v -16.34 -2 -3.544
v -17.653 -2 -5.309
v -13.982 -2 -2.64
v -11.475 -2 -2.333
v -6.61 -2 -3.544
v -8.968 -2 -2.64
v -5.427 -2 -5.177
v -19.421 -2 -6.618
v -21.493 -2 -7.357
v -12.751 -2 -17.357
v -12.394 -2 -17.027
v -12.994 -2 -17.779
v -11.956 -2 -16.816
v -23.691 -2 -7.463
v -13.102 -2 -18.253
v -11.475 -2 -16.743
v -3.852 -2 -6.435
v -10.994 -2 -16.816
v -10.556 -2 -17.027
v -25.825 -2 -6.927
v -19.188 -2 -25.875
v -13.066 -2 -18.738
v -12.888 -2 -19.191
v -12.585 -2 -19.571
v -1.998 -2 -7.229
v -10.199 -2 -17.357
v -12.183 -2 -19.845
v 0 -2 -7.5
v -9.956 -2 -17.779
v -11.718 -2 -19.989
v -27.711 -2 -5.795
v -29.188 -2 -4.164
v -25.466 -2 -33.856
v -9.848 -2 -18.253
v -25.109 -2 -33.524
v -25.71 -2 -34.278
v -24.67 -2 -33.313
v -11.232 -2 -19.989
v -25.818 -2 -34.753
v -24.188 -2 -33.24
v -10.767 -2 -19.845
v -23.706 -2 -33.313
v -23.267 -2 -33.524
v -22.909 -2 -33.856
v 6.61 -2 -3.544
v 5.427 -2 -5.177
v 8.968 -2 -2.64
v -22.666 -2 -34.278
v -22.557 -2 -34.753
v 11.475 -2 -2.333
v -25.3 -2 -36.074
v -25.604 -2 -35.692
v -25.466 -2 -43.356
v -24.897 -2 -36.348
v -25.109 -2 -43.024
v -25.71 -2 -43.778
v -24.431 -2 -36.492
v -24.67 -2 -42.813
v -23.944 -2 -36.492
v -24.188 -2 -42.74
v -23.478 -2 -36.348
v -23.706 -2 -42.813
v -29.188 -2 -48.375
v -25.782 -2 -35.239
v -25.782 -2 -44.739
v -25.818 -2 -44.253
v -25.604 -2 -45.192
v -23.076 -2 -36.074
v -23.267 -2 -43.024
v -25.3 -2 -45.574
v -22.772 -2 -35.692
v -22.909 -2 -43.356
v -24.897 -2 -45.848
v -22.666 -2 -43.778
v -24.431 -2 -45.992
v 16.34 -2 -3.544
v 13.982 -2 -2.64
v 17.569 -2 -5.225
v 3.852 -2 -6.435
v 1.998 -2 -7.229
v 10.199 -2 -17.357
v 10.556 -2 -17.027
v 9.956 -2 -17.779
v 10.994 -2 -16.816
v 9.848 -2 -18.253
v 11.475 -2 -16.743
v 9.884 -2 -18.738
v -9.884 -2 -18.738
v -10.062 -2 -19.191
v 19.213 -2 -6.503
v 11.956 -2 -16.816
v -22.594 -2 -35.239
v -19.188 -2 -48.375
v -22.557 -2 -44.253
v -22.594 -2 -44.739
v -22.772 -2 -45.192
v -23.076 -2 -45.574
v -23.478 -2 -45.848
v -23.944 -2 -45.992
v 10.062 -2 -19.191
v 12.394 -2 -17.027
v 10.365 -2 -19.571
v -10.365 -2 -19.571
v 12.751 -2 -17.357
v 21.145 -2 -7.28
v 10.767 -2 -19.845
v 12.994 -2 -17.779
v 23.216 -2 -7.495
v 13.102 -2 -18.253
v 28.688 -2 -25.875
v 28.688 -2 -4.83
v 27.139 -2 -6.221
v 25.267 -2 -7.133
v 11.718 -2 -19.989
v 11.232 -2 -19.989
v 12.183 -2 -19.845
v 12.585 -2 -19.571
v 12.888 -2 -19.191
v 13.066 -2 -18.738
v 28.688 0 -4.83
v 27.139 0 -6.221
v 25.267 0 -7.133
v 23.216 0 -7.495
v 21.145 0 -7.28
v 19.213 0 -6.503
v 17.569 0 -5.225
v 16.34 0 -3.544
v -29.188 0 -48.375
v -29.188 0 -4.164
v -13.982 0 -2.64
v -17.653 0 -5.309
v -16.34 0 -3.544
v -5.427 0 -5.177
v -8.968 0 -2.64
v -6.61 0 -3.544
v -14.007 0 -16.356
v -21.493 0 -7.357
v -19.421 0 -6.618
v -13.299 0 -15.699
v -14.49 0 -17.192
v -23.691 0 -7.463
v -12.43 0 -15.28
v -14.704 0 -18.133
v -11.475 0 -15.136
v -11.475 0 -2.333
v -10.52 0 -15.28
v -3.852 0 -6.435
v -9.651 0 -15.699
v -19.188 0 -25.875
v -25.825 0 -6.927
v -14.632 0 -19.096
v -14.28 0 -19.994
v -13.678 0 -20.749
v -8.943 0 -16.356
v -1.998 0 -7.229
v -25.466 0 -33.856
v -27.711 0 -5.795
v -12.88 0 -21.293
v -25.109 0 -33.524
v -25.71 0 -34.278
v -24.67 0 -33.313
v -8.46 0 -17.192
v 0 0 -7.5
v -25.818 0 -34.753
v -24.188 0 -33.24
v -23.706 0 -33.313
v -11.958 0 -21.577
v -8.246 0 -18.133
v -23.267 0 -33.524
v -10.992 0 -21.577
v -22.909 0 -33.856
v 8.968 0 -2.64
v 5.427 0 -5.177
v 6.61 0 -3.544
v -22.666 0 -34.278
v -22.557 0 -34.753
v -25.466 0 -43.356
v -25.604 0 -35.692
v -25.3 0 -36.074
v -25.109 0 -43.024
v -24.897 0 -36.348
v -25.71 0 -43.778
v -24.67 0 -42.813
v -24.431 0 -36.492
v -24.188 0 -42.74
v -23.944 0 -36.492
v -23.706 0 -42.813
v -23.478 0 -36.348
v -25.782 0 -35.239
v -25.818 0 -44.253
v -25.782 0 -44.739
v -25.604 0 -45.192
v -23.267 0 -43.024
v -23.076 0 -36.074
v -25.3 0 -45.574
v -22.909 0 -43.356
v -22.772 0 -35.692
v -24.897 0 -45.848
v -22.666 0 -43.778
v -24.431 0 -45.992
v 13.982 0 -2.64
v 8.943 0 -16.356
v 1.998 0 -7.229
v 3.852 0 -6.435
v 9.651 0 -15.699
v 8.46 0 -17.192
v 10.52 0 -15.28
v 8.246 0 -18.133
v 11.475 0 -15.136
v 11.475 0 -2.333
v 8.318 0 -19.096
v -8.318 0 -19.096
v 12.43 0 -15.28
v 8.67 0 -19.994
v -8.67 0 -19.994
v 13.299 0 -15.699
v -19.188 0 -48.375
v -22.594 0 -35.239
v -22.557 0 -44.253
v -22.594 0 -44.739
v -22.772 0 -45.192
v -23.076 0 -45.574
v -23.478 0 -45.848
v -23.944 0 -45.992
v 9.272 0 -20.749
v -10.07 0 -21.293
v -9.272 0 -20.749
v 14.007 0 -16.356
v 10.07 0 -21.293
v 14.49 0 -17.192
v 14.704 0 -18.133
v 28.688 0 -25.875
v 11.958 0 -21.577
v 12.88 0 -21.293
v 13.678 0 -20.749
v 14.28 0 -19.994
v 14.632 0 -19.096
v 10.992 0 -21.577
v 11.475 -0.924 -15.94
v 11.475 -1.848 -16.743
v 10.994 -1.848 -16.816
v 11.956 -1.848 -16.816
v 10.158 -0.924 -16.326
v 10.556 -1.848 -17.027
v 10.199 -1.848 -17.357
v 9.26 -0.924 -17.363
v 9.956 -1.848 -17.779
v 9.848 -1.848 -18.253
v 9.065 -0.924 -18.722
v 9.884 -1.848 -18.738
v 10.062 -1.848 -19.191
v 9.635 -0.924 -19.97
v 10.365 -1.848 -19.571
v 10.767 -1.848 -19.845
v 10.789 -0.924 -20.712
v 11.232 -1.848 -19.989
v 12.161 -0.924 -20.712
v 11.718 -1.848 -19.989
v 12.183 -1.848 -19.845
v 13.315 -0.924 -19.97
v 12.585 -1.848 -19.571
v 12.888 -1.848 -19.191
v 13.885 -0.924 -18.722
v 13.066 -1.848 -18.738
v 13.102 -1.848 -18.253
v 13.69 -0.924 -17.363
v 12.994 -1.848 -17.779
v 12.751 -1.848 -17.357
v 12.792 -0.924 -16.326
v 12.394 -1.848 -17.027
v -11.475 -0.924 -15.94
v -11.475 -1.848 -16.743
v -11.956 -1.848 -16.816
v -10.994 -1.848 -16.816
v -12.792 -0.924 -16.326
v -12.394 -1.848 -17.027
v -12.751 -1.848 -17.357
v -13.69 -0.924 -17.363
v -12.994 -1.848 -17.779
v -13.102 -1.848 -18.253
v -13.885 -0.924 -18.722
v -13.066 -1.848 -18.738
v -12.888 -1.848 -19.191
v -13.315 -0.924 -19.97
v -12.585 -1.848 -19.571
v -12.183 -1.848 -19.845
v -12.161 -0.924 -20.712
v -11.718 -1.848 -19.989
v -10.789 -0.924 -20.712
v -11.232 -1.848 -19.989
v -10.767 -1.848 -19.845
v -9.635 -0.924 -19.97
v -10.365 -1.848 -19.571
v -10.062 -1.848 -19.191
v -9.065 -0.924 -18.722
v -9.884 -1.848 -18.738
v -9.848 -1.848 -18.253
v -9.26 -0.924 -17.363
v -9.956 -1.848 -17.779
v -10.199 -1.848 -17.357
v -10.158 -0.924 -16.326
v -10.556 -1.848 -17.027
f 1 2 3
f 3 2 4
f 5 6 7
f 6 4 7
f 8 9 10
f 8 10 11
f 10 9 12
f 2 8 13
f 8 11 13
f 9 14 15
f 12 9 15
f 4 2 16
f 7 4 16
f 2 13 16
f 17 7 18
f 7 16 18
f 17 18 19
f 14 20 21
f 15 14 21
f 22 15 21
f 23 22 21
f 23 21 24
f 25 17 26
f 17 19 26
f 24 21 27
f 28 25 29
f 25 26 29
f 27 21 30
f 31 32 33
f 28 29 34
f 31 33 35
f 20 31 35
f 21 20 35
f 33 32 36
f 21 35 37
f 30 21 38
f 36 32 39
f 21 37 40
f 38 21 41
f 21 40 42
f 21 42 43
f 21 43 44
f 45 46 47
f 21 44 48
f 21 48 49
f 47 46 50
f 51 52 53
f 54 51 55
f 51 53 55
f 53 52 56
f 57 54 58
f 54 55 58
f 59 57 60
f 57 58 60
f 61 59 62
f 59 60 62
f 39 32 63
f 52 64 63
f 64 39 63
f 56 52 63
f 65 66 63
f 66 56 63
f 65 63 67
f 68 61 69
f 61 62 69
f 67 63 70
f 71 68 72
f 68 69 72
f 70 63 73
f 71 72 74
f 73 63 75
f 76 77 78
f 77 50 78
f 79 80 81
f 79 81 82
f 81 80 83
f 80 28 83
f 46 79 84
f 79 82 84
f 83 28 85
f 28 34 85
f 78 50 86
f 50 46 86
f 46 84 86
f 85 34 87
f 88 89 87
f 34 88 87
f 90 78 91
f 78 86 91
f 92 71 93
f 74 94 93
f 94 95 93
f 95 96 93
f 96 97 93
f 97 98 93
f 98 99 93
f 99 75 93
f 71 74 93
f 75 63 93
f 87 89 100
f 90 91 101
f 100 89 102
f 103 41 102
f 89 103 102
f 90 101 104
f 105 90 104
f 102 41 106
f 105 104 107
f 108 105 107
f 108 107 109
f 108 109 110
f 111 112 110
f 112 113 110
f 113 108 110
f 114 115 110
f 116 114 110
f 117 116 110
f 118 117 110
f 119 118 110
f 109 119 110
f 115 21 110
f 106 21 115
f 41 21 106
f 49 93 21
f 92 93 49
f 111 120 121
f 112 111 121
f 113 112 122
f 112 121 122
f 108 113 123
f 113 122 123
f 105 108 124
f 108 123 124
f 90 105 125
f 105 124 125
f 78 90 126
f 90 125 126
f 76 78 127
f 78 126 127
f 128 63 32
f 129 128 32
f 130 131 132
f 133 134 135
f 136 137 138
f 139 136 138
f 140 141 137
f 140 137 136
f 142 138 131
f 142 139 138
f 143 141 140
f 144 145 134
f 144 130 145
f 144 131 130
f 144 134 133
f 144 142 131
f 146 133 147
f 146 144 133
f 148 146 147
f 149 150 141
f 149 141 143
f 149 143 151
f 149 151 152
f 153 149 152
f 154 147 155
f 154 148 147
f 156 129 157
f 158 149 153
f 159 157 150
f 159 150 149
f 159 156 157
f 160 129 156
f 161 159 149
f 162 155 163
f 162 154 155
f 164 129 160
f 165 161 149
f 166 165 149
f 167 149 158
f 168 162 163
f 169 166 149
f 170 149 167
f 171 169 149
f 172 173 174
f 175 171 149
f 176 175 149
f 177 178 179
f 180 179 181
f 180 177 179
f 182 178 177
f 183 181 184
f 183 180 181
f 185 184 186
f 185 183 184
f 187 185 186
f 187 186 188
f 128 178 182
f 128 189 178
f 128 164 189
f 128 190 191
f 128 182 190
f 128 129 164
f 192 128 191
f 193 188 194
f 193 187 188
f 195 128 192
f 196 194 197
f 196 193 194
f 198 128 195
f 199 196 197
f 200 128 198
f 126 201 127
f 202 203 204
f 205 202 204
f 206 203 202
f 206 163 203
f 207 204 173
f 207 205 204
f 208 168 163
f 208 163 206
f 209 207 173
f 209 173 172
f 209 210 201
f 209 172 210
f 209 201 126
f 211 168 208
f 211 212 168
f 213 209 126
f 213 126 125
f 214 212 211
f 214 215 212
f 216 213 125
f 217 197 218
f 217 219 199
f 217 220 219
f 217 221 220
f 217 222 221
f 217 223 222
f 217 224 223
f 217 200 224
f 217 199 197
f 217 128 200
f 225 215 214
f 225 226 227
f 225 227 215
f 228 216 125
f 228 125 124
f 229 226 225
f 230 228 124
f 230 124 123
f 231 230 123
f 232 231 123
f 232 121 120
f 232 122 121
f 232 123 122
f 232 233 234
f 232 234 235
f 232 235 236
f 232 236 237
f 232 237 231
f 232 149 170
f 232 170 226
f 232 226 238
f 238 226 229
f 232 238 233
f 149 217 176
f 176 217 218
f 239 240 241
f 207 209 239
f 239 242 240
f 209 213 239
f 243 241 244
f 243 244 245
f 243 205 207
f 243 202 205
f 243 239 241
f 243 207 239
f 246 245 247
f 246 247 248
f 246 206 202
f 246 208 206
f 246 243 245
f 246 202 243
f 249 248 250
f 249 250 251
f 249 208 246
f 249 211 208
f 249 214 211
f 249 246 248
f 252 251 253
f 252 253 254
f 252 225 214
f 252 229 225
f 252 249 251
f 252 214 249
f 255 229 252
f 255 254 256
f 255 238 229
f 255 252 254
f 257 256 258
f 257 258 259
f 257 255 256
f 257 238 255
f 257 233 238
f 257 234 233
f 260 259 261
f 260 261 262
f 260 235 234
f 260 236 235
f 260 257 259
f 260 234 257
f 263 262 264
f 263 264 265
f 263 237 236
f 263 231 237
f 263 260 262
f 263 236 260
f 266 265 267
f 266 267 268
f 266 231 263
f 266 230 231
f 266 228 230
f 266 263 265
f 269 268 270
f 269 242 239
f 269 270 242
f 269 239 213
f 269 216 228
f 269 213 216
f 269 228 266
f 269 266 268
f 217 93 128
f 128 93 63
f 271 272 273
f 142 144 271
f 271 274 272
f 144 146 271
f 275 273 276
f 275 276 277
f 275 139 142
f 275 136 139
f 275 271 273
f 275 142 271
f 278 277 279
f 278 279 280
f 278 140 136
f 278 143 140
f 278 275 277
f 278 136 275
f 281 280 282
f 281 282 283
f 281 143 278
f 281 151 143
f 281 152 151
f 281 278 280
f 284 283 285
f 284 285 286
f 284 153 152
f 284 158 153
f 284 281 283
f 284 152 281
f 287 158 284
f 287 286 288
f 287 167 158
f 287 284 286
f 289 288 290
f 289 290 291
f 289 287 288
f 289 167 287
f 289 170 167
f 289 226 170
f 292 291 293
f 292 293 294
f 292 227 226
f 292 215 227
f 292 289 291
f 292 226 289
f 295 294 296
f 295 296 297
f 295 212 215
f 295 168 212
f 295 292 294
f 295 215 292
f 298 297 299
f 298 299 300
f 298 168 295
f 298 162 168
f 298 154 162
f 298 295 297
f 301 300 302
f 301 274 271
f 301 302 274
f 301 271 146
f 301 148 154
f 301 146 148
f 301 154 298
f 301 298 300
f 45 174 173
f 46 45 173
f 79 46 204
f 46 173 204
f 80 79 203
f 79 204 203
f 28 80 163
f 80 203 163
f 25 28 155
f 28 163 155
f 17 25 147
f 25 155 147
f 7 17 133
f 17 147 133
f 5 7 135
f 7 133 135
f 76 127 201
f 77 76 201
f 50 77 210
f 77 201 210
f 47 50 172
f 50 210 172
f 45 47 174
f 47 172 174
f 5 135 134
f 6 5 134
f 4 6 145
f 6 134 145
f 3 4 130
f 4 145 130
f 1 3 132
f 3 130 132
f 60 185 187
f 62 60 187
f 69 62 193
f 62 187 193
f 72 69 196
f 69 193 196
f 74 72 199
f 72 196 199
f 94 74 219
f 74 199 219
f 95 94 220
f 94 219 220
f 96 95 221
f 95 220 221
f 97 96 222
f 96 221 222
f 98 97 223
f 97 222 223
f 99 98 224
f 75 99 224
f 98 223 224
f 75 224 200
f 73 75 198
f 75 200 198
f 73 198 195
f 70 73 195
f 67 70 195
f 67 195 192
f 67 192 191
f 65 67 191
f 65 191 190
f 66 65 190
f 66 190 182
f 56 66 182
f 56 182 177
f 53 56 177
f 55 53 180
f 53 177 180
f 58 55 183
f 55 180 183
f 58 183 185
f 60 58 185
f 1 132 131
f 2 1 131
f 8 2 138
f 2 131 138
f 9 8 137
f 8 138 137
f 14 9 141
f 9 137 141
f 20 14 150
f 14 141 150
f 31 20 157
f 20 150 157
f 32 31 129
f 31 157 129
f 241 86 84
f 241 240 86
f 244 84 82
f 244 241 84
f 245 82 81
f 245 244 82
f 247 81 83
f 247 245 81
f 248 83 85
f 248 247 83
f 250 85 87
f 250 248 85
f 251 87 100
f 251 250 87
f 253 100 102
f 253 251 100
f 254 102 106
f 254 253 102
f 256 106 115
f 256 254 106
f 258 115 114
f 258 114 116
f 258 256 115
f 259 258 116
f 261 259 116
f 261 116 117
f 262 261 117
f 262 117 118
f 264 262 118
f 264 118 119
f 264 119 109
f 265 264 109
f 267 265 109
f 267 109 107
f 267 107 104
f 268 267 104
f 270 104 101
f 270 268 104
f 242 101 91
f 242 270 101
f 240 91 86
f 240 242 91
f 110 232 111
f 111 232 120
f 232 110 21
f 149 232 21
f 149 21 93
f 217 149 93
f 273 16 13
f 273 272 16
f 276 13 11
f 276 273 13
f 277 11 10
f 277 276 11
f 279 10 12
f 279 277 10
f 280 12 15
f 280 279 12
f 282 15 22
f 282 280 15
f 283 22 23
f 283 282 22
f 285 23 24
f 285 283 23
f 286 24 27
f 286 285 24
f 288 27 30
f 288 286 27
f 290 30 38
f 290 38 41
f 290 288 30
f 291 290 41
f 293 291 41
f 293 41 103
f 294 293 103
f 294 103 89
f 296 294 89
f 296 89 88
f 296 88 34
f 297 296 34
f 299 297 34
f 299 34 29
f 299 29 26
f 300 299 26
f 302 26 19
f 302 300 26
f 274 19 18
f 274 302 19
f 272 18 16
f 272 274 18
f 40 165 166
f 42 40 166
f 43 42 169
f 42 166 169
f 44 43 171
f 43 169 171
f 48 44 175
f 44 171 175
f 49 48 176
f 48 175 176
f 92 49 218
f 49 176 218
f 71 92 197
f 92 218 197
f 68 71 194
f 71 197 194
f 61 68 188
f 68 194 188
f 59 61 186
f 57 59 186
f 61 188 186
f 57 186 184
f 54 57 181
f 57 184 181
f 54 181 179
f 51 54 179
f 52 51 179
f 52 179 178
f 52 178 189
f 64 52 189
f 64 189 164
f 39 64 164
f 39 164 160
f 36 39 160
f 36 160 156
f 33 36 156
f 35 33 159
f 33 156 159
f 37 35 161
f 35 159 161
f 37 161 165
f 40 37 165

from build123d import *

# Parameters (mm, degrees)
BASE_FLANGE1_START                            = -2
BASE_FLANGE1_DEPTH                            = 2
SKETCH8_R                                     = 1.635
CUT_EXTRUDE1_DEPTH                            = 2
CSK_FOR_4_FLAT_HEAD_SOCKET_CAP_SCREW1_A_COUNT = 2
CSK_FOR_4_FLAT_HEAD_SOCKET_CAP_SCREW1_A_PITCH = 22.95
CUT_EXTRUDE2_DEPTH                            = 2


# Read off the part's stored shape, not the designer's step: Base-Flange1
with BuildPart() as part:
    # Base-Flange1 outline → Base-Flange1 (new body)
    with BuildSketch(Plane(origin=(0, 0, 0), x_dir=(1, 0, 0), z_dir=(0, 1, 0)).offset(BASE_FLANGE1_START)):
        with BuildLine():
            ThreePointArc((-29.187643745, 3.176759435), (-22.95, 7), (-16.712356255, 3.176759435))
            ThreePointArc((-16.712356255, 3.176759435), (-11.475, 1.832537182), (-6.237643745, 3.176759435))
            ThreePointArc((-6.237643745, 3.176759435), (0, 7), (6.237643745, 3.176759435))
            ThreePointArc((6.237643745, 3.176759435), (11.475, 1.832537182), (16.712356255, 3.176759435))
            ThreePointArc((16.712356255, 3.176759435), (22.95, 7), (29.187643745, 3.176759435))
            Line((29.187643745, 3.176759435), (29.187643745, 25.875))
            Line((29.187643745, 25.875), (-19.187643745, 25.875))
            Line((-19.187643745, 25.875), (-19.187643745, 48.375))
            Line((-19.187643745, 48.375), (-29.187643745, 48.375))
            Line((-29.187643745, 48.375), (-29.187643745, 3.176759435))
        make_face()
    extrude(amount=BASE_FLANGE1_DEPTH)

    # Sketch8 → Cut-Extrude1 (cut)
    with BuildSketch(Plane(origin=(0, 0, 0), x_dir=(1, 0, 0), z_dir=(0, 1, 0))):
        with Locations(Location((-24.187643745, 44.375, 0), (0, 0, 270))):
            Circle(SKETCH8_R)
        with Locations(Location((-24.187643745, 34.875, 0), (0, 0, 270))):
            Circle(SKETCH8_R)
    extrude(amount=-CUT_EXTRUDE1_DEPTH, mode=Mode.SUBTRACT)

    # Sketch10 → CSK for #4 Flat Head Socket Cap Screw1 (revolve, cut)
    with BuildSketch(Plane(origin=(11.475, 0, -18.375), x_dir=(0, 0, 1), z_dir=(1, 0, 0))):
        Polygon((0, 0), (0, 2.980574487), (1.63195, 2), (1.63195, 1.848124365), (3.2385, 0), align=None)
    csk_for_4_flat_head_socket_cap_screw1 = revolve(axis=Axis((11.475, 6.35, -18.375), (0, -1, 0)), mode=Mode.SUBTRACT)

    # CSK for #4 Flat Head Socket Cap Screw1 a: CSK for #4 Flat Head Socket Cap Screw1 ×2
    with Locations(*[(-i * CSK_FOR_4_FLAT_HEAD_SOCKET_CAP_SCREW1_A_PITCH, 0, 0) for i in range(1, CSK_FOR_4_FLAT_HEAD_SOCKET_CAP_SCREW1_A_COUNT)]):
        add(csk_for_4_flat_head_socket_cap_screw1, mode=Mode.SUBTRACT)

    # Sketch12 → Cut-Extrude2 (cut)
    with BuildSketch(Plane(origin=(0, 0, 0), x_dir=(1, 0, 0), z_dir=(0, 1, 0))):
        with BuildLine():
            Line((-29.633189727, 3.403670823), (-29.633189727, -1.121913875))
            Line((-29.633189727, -1.121913875), (35.30589457, -1.121913875))
            Line((35.30589457, -1.121913875), (35.30589457, 25.875))
            Line((35.30589457, 25.875), (28.687643745, 25.875))
            Line((28.687643745, 25.875), (28.687643745, 4.83005634))
            ThreePointArc((28.687643745, 4.83005634), (22.173017349, 7.459644627), (16.340134062, 3.543962794))
            ThreePointArc((16.340134062, 3.543962794), (11.475, 2.332537182), (6.609865938, 3.543962794))
            ThreePointArc((6.609865938, 3.543962794), (0, 7.5), (-6.609865938, 3.543962794))
            ThreePointArc((-6.609865938, 3.543962794), (-11.475, 2.332537182), (-16.340134062, 3.543962794))
            ThreePointArc((-16.340134062, 3.543962794), (-23.029148934, 7.499582351), (-29.633189727, 3.403670823))
        make_face()
    extrude(amount=-CUT_EXTRUDE2_DEPTH, mode=Mode.SUBTRACT)


solid = part.part
